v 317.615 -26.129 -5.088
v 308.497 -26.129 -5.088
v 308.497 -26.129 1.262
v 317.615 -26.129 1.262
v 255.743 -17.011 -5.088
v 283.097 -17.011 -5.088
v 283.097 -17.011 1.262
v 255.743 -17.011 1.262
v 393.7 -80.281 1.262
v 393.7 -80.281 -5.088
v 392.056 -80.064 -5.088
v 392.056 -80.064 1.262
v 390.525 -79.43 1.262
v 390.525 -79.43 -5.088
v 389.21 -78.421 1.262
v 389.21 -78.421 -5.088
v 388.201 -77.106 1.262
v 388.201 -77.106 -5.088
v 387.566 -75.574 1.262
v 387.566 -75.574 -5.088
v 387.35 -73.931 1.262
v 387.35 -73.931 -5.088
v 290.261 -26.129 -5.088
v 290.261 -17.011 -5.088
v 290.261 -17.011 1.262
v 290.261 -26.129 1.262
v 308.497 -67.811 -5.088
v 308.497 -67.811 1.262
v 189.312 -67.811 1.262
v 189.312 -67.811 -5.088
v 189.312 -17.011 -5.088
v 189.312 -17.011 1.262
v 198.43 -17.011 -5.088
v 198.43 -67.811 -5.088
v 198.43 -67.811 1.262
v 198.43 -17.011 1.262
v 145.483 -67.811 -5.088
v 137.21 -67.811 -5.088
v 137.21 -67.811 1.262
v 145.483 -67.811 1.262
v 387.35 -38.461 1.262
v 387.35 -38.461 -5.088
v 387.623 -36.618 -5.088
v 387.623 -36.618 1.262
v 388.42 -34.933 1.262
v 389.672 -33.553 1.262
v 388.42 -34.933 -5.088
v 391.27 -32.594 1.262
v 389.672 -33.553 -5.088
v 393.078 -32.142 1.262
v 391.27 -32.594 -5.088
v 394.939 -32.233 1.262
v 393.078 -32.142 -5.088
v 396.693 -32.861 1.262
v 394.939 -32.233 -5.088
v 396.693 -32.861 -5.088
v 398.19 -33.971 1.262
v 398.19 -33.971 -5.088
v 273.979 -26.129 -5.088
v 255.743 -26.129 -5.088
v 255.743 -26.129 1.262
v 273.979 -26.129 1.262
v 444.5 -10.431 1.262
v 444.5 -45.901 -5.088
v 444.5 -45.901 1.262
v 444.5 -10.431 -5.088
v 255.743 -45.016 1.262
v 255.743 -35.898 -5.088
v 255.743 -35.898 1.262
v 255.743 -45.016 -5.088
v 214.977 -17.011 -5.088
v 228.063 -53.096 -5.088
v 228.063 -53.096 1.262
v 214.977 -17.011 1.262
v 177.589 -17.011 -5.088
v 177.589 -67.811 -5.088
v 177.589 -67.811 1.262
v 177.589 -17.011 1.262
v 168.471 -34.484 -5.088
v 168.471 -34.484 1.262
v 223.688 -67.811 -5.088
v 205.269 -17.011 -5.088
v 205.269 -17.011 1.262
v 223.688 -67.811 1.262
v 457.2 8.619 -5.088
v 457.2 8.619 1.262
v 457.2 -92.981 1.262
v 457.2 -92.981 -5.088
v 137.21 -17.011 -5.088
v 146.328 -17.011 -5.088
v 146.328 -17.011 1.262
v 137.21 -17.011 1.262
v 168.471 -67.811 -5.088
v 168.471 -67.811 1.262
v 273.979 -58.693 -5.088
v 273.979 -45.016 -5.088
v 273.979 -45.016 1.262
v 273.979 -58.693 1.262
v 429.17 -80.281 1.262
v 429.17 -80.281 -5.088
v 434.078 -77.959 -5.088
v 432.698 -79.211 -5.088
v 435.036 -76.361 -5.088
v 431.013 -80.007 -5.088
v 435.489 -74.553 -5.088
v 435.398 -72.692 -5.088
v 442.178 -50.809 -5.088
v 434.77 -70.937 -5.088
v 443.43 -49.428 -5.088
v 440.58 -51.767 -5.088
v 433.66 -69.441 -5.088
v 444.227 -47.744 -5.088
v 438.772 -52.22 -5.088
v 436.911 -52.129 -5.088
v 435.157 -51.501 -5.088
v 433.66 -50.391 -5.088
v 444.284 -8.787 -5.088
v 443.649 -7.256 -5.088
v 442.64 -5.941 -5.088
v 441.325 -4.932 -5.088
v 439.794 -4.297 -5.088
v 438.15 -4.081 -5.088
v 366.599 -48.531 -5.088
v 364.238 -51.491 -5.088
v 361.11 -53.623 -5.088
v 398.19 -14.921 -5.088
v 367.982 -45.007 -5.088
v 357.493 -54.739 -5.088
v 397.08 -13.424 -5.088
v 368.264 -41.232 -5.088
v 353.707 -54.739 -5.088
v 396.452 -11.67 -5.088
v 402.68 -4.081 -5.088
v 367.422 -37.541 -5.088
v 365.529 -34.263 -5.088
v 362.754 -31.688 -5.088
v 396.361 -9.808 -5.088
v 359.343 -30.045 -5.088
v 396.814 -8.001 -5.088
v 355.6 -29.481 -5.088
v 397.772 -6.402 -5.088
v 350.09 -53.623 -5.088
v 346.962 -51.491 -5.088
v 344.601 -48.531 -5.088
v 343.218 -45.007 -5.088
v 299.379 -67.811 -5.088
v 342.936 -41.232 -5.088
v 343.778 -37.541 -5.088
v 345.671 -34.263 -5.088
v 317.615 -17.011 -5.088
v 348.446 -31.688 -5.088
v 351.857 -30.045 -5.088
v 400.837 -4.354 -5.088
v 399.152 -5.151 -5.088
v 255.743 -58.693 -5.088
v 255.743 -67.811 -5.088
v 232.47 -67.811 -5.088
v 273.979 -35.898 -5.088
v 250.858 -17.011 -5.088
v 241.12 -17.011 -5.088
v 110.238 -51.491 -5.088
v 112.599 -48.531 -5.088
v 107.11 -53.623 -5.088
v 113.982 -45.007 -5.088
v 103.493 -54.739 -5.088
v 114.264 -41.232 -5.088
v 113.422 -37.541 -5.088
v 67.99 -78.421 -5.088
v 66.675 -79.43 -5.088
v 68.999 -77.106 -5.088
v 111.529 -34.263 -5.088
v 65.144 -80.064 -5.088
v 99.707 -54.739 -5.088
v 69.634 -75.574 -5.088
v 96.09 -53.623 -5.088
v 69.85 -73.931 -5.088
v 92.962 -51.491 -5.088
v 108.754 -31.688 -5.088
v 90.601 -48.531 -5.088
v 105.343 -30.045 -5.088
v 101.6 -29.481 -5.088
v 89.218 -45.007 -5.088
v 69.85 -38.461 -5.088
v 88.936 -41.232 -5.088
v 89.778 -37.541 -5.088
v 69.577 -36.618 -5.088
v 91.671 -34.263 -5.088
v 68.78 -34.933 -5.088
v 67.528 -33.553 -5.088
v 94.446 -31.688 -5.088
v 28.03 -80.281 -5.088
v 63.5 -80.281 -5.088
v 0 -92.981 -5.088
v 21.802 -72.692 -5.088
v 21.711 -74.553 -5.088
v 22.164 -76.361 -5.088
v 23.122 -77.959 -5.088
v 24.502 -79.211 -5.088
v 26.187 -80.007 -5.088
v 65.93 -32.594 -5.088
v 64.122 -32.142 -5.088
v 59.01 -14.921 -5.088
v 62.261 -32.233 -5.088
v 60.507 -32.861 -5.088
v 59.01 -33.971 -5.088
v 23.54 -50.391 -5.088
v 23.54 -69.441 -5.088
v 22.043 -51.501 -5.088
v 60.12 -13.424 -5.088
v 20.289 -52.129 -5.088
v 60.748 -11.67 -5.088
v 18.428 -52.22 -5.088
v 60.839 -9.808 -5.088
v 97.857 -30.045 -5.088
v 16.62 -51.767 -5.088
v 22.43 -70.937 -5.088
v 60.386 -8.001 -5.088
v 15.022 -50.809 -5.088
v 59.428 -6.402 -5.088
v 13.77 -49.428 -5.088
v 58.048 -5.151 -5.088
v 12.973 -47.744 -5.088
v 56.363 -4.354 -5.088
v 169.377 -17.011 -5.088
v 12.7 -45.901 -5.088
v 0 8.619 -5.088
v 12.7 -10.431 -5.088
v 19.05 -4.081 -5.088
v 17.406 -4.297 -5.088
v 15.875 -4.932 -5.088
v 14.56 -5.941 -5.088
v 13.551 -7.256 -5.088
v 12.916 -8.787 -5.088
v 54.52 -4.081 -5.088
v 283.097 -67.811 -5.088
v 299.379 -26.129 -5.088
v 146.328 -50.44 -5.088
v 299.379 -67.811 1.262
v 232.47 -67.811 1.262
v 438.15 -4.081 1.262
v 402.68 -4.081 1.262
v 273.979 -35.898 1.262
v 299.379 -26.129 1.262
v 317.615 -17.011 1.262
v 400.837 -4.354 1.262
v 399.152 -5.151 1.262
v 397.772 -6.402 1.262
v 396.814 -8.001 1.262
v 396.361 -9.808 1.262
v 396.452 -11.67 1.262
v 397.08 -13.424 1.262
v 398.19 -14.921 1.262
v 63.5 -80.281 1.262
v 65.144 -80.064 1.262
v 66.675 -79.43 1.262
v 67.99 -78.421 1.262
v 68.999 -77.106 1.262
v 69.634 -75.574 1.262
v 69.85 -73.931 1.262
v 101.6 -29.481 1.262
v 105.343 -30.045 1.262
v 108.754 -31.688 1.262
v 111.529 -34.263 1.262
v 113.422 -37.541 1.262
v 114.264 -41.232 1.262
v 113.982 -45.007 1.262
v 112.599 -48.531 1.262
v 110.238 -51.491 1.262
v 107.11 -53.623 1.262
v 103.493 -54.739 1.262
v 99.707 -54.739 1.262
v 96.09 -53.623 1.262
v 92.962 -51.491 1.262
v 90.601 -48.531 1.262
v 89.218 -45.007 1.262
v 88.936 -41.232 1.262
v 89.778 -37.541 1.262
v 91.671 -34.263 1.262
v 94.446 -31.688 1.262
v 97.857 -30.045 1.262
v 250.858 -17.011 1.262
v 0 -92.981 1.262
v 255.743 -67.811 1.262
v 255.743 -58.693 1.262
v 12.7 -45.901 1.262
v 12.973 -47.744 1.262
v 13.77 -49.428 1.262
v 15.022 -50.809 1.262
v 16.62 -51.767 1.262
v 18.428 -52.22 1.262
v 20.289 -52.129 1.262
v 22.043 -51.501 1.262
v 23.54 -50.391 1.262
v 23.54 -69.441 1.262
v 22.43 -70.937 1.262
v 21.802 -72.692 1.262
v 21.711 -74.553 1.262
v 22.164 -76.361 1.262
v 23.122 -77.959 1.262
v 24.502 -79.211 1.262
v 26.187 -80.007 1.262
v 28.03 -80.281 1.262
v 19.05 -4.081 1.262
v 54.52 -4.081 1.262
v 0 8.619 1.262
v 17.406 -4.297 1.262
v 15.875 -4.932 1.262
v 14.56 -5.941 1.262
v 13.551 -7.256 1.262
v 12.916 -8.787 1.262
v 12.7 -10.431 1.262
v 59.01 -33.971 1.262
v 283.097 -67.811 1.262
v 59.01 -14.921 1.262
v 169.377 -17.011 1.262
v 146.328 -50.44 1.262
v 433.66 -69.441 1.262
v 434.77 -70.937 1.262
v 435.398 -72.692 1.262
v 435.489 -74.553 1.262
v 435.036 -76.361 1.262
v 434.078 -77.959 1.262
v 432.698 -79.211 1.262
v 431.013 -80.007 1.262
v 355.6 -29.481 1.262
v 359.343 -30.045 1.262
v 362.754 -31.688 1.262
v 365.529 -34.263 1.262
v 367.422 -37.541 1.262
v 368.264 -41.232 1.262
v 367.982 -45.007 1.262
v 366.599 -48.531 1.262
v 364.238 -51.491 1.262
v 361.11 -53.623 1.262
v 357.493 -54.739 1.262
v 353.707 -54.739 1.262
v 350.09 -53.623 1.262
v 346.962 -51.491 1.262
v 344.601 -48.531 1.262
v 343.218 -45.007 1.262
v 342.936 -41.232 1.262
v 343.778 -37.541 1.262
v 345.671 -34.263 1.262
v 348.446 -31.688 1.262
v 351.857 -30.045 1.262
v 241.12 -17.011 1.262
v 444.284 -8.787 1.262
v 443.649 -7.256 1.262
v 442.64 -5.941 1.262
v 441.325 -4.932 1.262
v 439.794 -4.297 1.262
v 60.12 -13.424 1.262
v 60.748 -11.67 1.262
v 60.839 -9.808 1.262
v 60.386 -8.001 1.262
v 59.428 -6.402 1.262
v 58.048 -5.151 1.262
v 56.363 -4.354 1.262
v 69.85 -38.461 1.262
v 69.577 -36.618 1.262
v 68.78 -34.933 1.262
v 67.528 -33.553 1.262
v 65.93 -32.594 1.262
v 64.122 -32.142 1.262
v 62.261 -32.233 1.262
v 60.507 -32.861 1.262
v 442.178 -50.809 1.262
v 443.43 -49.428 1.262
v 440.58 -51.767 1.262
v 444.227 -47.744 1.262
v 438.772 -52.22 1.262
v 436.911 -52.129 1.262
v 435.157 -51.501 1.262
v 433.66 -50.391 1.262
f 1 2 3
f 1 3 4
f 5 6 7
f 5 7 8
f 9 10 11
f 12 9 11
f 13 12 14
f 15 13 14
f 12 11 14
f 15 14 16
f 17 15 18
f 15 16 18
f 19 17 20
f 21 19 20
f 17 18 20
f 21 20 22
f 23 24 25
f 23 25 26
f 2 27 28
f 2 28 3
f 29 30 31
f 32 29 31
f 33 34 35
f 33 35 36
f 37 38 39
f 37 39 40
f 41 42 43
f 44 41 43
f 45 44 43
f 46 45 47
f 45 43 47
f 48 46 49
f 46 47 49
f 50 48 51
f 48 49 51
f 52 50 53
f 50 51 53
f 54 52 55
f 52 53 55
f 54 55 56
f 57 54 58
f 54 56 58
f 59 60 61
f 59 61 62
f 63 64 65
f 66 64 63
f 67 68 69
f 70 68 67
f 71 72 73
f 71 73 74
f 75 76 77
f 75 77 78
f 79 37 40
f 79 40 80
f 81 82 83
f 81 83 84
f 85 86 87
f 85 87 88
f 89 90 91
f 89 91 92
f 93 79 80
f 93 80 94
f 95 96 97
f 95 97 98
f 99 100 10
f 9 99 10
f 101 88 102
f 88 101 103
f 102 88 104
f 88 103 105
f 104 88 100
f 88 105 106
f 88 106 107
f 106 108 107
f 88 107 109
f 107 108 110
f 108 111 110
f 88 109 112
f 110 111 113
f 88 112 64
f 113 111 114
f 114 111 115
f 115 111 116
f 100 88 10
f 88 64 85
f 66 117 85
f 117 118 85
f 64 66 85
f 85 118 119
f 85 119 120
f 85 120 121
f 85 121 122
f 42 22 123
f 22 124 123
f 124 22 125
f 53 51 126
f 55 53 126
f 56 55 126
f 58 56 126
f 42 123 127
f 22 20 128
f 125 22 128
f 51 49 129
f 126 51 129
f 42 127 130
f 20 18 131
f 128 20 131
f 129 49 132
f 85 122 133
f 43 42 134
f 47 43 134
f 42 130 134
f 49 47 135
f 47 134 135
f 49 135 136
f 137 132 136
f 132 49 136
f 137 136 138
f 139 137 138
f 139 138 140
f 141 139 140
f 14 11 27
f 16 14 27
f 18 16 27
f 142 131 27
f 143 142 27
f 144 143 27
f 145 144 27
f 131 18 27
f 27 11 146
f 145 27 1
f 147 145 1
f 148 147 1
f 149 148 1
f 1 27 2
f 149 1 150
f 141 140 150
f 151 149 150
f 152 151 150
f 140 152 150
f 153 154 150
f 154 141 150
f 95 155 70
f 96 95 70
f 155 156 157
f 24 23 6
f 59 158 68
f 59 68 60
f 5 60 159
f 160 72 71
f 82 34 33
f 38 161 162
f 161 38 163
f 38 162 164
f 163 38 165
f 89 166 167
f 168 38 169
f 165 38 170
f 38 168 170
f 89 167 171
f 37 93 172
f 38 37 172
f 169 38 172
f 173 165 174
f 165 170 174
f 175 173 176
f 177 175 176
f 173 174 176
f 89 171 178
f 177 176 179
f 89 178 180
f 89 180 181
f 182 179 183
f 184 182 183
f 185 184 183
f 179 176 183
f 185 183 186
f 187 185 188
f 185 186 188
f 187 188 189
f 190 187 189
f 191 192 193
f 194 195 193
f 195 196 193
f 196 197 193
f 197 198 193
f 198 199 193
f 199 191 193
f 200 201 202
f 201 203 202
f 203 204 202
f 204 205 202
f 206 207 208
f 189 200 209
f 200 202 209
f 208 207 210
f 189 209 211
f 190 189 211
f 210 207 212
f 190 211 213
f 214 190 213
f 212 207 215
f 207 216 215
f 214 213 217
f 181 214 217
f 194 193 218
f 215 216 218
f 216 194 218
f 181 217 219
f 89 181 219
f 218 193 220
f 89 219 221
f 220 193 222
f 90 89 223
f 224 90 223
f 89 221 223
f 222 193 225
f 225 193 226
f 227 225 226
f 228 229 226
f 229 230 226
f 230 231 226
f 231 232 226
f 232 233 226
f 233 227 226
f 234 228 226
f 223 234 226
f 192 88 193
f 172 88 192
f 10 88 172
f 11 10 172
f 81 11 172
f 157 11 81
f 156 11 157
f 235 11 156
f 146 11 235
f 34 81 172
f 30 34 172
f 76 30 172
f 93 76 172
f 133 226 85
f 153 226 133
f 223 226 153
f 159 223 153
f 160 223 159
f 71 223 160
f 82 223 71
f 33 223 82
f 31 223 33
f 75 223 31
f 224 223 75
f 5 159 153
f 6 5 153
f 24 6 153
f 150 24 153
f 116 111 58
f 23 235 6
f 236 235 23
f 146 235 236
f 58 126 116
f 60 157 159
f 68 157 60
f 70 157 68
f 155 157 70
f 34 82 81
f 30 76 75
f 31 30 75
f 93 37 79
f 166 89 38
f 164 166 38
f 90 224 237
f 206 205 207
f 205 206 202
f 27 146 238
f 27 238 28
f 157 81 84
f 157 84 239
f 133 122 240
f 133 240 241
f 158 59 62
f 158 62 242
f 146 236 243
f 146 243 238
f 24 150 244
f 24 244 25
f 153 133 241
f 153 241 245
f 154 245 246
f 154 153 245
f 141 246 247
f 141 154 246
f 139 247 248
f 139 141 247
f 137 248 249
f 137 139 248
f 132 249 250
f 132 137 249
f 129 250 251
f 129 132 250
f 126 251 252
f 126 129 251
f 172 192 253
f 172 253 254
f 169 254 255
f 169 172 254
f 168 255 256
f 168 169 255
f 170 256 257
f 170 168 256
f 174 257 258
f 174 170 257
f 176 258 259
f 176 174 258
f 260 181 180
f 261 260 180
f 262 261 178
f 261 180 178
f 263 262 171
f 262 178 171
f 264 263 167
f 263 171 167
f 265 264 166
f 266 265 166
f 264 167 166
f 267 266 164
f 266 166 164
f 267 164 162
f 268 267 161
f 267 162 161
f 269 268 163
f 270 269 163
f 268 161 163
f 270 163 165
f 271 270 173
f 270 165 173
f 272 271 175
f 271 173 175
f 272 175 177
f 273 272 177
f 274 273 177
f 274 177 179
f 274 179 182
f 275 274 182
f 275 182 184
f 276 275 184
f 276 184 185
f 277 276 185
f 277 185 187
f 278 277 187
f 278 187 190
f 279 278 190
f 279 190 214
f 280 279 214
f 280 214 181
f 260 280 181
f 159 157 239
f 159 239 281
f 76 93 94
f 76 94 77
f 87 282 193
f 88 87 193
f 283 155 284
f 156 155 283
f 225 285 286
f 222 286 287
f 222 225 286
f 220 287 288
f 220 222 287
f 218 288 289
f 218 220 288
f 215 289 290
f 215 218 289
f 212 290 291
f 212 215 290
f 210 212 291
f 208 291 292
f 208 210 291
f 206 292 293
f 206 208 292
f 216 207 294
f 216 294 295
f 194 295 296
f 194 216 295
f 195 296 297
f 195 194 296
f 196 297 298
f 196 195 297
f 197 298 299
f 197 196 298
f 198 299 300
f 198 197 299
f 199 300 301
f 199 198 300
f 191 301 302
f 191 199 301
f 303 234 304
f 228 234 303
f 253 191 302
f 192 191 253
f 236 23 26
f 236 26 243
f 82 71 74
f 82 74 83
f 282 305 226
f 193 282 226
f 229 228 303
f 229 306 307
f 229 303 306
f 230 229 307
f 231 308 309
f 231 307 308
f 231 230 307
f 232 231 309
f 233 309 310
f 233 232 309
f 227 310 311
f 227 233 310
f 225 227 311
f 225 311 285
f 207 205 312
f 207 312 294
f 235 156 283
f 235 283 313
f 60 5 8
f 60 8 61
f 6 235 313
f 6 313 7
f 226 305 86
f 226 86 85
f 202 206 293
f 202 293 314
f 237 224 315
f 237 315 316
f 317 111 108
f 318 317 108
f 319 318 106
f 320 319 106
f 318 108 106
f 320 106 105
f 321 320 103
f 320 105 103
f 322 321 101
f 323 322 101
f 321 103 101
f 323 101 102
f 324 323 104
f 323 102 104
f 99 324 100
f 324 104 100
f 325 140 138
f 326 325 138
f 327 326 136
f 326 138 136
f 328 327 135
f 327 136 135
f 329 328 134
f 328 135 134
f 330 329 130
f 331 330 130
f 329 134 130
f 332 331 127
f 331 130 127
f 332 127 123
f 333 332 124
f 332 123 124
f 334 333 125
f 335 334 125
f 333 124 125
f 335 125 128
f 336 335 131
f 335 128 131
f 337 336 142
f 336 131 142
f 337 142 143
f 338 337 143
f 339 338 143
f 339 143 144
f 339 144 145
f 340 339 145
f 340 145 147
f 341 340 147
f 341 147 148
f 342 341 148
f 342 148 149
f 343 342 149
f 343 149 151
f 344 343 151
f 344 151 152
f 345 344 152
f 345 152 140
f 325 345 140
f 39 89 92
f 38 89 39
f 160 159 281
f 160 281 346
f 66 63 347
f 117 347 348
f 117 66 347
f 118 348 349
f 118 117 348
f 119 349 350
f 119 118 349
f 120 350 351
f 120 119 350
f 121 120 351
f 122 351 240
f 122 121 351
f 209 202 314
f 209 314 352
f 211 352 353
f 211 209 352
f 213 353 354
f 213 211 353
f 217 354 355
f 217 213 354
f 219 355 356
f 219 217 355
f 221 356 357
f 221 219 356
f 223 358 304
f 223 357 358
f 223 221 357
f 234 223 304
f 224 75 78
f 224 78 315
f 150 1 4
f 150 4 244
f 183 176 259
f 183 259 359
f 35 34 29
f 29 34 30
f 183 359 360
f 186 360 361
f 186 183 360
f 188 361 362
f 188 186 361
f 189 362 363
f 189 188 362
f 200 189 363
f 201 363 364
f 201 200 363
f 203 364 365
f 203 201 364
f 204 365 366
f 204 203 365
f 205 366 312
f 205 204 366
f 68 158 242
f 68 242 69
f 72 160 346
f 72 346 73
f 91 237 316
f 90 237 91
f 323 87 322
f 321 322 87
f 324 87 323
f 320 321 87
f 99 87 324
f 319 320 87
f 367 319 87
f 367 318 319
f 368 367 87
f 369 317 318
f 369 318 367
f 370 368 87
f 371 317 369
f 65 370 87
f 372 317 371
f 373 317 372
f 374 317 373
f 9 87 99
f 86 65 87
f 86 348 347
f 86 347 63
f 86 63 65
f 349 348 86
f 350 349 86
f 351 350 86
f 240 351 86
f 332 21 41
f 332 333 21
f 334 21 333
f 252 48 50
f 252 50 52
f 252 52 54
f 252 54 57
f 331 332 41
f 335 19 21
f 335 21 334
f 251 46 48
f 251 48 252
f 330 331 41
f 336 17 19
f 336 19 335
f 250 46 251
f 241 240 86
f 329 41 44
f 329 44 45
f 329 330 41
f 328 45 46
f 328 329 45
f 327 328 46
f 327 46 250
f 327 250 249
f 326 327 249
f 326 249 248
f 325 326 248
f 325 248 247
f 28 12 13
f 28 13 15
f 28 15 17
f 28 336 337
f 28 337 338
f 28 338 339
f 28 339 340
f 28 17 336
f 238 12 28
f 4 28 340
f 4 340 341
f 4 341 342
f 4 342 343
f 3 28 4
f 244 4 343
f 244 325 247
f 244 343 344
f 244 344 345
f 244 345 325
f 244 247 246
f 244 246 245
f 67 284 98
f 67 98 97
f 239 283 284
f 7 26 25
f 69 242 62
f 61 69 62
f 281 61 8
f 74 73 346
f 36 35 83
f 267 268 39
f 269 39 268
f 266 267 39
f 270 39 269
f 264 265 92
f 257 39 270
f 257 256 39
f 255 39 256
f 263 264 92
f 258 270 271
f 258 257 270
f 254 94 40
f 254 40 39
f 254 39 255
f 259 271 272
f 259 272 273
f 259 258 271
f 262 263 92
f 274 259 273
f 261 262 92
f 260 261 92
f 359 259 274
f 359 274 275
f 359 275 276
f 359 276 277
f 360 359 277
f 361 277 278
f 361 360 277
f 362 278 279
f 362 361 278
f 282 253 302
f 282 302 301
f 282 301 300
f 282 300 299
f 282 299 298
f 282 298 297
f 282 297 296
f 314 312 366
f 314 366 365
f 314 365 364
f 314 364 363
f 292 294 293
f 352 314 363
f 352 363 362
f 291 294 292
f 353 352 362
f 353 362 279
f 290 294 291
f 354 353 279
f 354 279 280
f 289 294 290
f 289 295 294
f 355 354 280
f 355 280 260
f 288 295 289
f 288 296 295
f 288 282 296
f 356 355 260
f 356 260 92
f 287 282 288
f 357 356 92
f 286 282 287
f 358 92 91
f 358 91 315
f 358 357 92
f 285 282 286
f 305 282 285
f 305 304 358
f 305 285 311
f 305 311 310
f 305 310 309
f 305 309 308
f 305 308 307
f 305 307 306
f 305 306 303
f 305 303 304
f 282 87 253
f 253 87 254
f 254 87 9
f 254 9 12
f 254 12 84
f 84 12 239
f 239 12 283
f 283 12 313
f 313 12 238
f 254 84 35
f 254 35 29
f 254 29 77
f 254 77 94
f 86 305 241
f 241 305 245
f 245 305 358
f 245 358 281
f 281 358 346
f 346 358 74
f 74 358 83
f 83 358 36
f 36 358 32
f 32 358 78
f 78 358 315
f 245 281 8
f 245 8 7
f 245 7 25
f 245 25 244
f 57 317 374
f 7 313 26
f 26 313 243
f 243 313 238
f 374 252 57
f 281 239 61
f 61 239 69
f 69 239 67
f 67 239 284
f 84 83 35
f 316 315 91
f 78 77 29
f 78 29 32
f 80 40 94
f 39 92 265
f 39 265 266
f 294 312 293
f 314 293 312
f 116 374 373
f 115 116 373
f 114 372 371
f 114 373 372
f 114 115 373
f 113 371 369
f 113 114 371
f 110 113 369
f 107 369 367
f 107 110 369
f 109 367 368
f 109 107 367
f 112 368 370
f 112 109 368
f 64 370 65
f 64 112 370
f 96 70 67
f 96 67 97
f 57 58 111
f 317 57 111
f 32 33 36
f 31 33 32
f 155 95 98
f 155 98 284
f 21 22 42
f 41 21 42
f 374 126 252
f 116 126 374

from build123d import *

# Parameters (mm, degrees)
SKETCH1_W           = 6.35
SKETCH1_H           = 101.6
BOSS_EXTRUDE1_DEPTH = 457.2
SKETCH2_R           = 12.7
CUT_EXTRUDE1_DEPTH  = 467.602190566
SKETCH3_W           = 9.117948718
SKETCH3_H           = 50.8
CUT_EXTRUDE2_DEPTH  = 467.602190566


with BuildPart() as part:
    # Sketch1 → Boss-Extrude1 (new body)
    with BuildSketch(Plane(origin=(0, 0, 0), x_dir=(0, 0, -1), z_dir=(1, 0, 0))):
        with Locations((1.913371748, -42.180867605)):
            Rectangle(SKETCH1_W, SKETCH1_H)
    extrude(amount=BOSS_EXTRUDE1_DEPTH)

    # Sketch2 → Cut-Extrude1 (cut, through all)
    with BuildSketch(Plane(origin=(0, 0, -5.088371748), x_dir=(-1, 0, 0), z_dir=(0, 0, -1))):
        with Locations(Location((-355.6, -42.180867605, 0), (0, 0, 90))):
            Circle(SKETCH2_R)
        with Locations(Location((-101.6, -42.180867605, 0), (0, 0, 90))):
            Circle(SKETCH2_R)
    extrude(amount=-CUT_EXTRUDE1_DEPTH, mode=Mode.SUBTRACT)

    # Sketch3 → Cut-Extrude2 (cut, through all)
    with BuildSketch(Plane(origin=(0, 0, -5.088371748), x_dir=(-1, 0, 0), z_dir=(0, 0, -1))):
        with BuildLine():
            Line((-438.15, -4.080867605), (-402.680256121, -4.080867605))
            ThreePointArc((-402.680256121, -4.080867605), (-396.81362109, -8.000827809), (-398.190128061, -14.920995665))
            Line((-398.190128061, -14.920995665), (-433.659871939, -50.390739544))
            ThreePointArc((-433.659871939, -50.390739544), (-440.580039796, -51.767246515), (-444.5, -45.900611484))
            Line((-444.5, -45.900611484), (-444.5, -10.430867605))
            ThreePointArc((-444.5, -10.430867605), (-442.640128061, -5.940739544), (-438.15, -4.080867605))
        make_face()
        with BuildLine():
            Line((-398.190128061, -33.970995665), (-433.659871939, -69.440739544))
            ThreePointArc((-433.659871939, -69.440739544), (-435.03637891, -76.3609074), (-429.169743879, -80.280867605))
            Line((-429.169743879, -80.280867605), (-393.7, -80.280867605))
            ThreePointArc((-393.7, -80.280867605), (-389.209871939, -78.420995665), (-387.35, -73.930867605))
            Line((-387.35, -73.930867605), (-387.35, -38.461123726))
            ThreePointArc((-387.35, -38.461123726), (-391.269960204, -32.594488694), (-398.190128061, -33.970995665))
        make_face()
        with BuildLine():
            Line((-69.85, -73.930867605), (-69.85, -38.461123726))
            ThreePointArc((-69.85, -38.461123726), (-65.930039796, -32.594488694), (-59.009871939, -33.970995665))
            Line((-59.009871939, -33.970995665), (-23.540128061, -69.440739544))
            ThreePointArc((-23.540128061, -69.440739544), (-22.16362109, -76.3609074), (-28.030256121, -80.280867605))
            Line((-28.030256121, -80.280867605), (-63.5, -80.280867605))
            ThreePointArc((-63.5, -80.280867605), (-67.990128061, -78.420995665), (-69.85, -73.930867605))
        make_face()
        with BuildLine():
            Line((-23.540128061, -50.390739544), (-59.009871939, -14.920995665))
            ThreePointArc((-59.009871939, -14.920995665), (-60.38637891, -8.000827809), (-54.519743879, -4.080867605))
            Line((-54.519743879, -4.080867605), (-19.05, -4.080867605))
            ThreePointArc((-19.05, -4.080867605), (-14.559871939, -5.940739544), (-12.7, -10.430867605))
            Line((-12.7, -10.430867605), (-12.7, -45.900611484))
            ThreePointArc((-12.7, -45.900611484), (-16.619960204, -51.767246515), (-23.540128061, -50.390739544))
        make_face()
        Polygon((-317.614703405, -17.01094408), (-290.260857251, -17.01094408), (-290.260857251, -26.128892798), (-299.378805969, -26.128892798), (-299.378805969, -67.81094408), (-308.496754687, -67.81094408), (-308.496754687, -26.128892798), (-317.614703405, -26.128892798), align=None)
        Polygon((-283.096754687, -17.01094408), (-255.742908533, -17.01094408), (-255.742908533, -26.128892798), (-273.978805969, -26.128892798), (-273.978805969, -35.898123567), (-255.742908533, -35.898123567), (-255.742908533, -45.016072285), (-273.978805969, -45.016072285), (-273.978805969, -58.692995362), (-255.742908533, -58.692995362), (-255.742908533, -67.81094408), (-283.096754687, -67.81094408), align=None)
        Polygon((-250.858293149, -17.01094408), (-241.119591226, -17.01094408), (-228.063421354, -53.096040233), (-214.976722636, -17.01094408), (-205.268549559, -17.01094408), (-223.687620072, -67.81094408), (-232.469751482, -67.81094408), align=None)
        with Locations((-193.871113661, -42.41094408)):
            Rectangle(SKETCH3_W, SKETCH3_H)
        Polygon((-177.589062379, -17.01094408), (-169.376802764, -17.01094408), (-146.327523918, -50.440030618), (-146.327523918, -17.01094408), (-137.2095752, -17.01094408), (-137.2095752, -67.81094408), (-145.482892508, -67.81094408), (-168.471113661, -34.483620362), (-168.471113661, -67.81094408), (-177.589062379, -67.81094408), align=None)
    extrude(amount=-CUT_EXTRUDE2_DEPTH, mode=Mode.SUBTRACT)


solid = part.part
